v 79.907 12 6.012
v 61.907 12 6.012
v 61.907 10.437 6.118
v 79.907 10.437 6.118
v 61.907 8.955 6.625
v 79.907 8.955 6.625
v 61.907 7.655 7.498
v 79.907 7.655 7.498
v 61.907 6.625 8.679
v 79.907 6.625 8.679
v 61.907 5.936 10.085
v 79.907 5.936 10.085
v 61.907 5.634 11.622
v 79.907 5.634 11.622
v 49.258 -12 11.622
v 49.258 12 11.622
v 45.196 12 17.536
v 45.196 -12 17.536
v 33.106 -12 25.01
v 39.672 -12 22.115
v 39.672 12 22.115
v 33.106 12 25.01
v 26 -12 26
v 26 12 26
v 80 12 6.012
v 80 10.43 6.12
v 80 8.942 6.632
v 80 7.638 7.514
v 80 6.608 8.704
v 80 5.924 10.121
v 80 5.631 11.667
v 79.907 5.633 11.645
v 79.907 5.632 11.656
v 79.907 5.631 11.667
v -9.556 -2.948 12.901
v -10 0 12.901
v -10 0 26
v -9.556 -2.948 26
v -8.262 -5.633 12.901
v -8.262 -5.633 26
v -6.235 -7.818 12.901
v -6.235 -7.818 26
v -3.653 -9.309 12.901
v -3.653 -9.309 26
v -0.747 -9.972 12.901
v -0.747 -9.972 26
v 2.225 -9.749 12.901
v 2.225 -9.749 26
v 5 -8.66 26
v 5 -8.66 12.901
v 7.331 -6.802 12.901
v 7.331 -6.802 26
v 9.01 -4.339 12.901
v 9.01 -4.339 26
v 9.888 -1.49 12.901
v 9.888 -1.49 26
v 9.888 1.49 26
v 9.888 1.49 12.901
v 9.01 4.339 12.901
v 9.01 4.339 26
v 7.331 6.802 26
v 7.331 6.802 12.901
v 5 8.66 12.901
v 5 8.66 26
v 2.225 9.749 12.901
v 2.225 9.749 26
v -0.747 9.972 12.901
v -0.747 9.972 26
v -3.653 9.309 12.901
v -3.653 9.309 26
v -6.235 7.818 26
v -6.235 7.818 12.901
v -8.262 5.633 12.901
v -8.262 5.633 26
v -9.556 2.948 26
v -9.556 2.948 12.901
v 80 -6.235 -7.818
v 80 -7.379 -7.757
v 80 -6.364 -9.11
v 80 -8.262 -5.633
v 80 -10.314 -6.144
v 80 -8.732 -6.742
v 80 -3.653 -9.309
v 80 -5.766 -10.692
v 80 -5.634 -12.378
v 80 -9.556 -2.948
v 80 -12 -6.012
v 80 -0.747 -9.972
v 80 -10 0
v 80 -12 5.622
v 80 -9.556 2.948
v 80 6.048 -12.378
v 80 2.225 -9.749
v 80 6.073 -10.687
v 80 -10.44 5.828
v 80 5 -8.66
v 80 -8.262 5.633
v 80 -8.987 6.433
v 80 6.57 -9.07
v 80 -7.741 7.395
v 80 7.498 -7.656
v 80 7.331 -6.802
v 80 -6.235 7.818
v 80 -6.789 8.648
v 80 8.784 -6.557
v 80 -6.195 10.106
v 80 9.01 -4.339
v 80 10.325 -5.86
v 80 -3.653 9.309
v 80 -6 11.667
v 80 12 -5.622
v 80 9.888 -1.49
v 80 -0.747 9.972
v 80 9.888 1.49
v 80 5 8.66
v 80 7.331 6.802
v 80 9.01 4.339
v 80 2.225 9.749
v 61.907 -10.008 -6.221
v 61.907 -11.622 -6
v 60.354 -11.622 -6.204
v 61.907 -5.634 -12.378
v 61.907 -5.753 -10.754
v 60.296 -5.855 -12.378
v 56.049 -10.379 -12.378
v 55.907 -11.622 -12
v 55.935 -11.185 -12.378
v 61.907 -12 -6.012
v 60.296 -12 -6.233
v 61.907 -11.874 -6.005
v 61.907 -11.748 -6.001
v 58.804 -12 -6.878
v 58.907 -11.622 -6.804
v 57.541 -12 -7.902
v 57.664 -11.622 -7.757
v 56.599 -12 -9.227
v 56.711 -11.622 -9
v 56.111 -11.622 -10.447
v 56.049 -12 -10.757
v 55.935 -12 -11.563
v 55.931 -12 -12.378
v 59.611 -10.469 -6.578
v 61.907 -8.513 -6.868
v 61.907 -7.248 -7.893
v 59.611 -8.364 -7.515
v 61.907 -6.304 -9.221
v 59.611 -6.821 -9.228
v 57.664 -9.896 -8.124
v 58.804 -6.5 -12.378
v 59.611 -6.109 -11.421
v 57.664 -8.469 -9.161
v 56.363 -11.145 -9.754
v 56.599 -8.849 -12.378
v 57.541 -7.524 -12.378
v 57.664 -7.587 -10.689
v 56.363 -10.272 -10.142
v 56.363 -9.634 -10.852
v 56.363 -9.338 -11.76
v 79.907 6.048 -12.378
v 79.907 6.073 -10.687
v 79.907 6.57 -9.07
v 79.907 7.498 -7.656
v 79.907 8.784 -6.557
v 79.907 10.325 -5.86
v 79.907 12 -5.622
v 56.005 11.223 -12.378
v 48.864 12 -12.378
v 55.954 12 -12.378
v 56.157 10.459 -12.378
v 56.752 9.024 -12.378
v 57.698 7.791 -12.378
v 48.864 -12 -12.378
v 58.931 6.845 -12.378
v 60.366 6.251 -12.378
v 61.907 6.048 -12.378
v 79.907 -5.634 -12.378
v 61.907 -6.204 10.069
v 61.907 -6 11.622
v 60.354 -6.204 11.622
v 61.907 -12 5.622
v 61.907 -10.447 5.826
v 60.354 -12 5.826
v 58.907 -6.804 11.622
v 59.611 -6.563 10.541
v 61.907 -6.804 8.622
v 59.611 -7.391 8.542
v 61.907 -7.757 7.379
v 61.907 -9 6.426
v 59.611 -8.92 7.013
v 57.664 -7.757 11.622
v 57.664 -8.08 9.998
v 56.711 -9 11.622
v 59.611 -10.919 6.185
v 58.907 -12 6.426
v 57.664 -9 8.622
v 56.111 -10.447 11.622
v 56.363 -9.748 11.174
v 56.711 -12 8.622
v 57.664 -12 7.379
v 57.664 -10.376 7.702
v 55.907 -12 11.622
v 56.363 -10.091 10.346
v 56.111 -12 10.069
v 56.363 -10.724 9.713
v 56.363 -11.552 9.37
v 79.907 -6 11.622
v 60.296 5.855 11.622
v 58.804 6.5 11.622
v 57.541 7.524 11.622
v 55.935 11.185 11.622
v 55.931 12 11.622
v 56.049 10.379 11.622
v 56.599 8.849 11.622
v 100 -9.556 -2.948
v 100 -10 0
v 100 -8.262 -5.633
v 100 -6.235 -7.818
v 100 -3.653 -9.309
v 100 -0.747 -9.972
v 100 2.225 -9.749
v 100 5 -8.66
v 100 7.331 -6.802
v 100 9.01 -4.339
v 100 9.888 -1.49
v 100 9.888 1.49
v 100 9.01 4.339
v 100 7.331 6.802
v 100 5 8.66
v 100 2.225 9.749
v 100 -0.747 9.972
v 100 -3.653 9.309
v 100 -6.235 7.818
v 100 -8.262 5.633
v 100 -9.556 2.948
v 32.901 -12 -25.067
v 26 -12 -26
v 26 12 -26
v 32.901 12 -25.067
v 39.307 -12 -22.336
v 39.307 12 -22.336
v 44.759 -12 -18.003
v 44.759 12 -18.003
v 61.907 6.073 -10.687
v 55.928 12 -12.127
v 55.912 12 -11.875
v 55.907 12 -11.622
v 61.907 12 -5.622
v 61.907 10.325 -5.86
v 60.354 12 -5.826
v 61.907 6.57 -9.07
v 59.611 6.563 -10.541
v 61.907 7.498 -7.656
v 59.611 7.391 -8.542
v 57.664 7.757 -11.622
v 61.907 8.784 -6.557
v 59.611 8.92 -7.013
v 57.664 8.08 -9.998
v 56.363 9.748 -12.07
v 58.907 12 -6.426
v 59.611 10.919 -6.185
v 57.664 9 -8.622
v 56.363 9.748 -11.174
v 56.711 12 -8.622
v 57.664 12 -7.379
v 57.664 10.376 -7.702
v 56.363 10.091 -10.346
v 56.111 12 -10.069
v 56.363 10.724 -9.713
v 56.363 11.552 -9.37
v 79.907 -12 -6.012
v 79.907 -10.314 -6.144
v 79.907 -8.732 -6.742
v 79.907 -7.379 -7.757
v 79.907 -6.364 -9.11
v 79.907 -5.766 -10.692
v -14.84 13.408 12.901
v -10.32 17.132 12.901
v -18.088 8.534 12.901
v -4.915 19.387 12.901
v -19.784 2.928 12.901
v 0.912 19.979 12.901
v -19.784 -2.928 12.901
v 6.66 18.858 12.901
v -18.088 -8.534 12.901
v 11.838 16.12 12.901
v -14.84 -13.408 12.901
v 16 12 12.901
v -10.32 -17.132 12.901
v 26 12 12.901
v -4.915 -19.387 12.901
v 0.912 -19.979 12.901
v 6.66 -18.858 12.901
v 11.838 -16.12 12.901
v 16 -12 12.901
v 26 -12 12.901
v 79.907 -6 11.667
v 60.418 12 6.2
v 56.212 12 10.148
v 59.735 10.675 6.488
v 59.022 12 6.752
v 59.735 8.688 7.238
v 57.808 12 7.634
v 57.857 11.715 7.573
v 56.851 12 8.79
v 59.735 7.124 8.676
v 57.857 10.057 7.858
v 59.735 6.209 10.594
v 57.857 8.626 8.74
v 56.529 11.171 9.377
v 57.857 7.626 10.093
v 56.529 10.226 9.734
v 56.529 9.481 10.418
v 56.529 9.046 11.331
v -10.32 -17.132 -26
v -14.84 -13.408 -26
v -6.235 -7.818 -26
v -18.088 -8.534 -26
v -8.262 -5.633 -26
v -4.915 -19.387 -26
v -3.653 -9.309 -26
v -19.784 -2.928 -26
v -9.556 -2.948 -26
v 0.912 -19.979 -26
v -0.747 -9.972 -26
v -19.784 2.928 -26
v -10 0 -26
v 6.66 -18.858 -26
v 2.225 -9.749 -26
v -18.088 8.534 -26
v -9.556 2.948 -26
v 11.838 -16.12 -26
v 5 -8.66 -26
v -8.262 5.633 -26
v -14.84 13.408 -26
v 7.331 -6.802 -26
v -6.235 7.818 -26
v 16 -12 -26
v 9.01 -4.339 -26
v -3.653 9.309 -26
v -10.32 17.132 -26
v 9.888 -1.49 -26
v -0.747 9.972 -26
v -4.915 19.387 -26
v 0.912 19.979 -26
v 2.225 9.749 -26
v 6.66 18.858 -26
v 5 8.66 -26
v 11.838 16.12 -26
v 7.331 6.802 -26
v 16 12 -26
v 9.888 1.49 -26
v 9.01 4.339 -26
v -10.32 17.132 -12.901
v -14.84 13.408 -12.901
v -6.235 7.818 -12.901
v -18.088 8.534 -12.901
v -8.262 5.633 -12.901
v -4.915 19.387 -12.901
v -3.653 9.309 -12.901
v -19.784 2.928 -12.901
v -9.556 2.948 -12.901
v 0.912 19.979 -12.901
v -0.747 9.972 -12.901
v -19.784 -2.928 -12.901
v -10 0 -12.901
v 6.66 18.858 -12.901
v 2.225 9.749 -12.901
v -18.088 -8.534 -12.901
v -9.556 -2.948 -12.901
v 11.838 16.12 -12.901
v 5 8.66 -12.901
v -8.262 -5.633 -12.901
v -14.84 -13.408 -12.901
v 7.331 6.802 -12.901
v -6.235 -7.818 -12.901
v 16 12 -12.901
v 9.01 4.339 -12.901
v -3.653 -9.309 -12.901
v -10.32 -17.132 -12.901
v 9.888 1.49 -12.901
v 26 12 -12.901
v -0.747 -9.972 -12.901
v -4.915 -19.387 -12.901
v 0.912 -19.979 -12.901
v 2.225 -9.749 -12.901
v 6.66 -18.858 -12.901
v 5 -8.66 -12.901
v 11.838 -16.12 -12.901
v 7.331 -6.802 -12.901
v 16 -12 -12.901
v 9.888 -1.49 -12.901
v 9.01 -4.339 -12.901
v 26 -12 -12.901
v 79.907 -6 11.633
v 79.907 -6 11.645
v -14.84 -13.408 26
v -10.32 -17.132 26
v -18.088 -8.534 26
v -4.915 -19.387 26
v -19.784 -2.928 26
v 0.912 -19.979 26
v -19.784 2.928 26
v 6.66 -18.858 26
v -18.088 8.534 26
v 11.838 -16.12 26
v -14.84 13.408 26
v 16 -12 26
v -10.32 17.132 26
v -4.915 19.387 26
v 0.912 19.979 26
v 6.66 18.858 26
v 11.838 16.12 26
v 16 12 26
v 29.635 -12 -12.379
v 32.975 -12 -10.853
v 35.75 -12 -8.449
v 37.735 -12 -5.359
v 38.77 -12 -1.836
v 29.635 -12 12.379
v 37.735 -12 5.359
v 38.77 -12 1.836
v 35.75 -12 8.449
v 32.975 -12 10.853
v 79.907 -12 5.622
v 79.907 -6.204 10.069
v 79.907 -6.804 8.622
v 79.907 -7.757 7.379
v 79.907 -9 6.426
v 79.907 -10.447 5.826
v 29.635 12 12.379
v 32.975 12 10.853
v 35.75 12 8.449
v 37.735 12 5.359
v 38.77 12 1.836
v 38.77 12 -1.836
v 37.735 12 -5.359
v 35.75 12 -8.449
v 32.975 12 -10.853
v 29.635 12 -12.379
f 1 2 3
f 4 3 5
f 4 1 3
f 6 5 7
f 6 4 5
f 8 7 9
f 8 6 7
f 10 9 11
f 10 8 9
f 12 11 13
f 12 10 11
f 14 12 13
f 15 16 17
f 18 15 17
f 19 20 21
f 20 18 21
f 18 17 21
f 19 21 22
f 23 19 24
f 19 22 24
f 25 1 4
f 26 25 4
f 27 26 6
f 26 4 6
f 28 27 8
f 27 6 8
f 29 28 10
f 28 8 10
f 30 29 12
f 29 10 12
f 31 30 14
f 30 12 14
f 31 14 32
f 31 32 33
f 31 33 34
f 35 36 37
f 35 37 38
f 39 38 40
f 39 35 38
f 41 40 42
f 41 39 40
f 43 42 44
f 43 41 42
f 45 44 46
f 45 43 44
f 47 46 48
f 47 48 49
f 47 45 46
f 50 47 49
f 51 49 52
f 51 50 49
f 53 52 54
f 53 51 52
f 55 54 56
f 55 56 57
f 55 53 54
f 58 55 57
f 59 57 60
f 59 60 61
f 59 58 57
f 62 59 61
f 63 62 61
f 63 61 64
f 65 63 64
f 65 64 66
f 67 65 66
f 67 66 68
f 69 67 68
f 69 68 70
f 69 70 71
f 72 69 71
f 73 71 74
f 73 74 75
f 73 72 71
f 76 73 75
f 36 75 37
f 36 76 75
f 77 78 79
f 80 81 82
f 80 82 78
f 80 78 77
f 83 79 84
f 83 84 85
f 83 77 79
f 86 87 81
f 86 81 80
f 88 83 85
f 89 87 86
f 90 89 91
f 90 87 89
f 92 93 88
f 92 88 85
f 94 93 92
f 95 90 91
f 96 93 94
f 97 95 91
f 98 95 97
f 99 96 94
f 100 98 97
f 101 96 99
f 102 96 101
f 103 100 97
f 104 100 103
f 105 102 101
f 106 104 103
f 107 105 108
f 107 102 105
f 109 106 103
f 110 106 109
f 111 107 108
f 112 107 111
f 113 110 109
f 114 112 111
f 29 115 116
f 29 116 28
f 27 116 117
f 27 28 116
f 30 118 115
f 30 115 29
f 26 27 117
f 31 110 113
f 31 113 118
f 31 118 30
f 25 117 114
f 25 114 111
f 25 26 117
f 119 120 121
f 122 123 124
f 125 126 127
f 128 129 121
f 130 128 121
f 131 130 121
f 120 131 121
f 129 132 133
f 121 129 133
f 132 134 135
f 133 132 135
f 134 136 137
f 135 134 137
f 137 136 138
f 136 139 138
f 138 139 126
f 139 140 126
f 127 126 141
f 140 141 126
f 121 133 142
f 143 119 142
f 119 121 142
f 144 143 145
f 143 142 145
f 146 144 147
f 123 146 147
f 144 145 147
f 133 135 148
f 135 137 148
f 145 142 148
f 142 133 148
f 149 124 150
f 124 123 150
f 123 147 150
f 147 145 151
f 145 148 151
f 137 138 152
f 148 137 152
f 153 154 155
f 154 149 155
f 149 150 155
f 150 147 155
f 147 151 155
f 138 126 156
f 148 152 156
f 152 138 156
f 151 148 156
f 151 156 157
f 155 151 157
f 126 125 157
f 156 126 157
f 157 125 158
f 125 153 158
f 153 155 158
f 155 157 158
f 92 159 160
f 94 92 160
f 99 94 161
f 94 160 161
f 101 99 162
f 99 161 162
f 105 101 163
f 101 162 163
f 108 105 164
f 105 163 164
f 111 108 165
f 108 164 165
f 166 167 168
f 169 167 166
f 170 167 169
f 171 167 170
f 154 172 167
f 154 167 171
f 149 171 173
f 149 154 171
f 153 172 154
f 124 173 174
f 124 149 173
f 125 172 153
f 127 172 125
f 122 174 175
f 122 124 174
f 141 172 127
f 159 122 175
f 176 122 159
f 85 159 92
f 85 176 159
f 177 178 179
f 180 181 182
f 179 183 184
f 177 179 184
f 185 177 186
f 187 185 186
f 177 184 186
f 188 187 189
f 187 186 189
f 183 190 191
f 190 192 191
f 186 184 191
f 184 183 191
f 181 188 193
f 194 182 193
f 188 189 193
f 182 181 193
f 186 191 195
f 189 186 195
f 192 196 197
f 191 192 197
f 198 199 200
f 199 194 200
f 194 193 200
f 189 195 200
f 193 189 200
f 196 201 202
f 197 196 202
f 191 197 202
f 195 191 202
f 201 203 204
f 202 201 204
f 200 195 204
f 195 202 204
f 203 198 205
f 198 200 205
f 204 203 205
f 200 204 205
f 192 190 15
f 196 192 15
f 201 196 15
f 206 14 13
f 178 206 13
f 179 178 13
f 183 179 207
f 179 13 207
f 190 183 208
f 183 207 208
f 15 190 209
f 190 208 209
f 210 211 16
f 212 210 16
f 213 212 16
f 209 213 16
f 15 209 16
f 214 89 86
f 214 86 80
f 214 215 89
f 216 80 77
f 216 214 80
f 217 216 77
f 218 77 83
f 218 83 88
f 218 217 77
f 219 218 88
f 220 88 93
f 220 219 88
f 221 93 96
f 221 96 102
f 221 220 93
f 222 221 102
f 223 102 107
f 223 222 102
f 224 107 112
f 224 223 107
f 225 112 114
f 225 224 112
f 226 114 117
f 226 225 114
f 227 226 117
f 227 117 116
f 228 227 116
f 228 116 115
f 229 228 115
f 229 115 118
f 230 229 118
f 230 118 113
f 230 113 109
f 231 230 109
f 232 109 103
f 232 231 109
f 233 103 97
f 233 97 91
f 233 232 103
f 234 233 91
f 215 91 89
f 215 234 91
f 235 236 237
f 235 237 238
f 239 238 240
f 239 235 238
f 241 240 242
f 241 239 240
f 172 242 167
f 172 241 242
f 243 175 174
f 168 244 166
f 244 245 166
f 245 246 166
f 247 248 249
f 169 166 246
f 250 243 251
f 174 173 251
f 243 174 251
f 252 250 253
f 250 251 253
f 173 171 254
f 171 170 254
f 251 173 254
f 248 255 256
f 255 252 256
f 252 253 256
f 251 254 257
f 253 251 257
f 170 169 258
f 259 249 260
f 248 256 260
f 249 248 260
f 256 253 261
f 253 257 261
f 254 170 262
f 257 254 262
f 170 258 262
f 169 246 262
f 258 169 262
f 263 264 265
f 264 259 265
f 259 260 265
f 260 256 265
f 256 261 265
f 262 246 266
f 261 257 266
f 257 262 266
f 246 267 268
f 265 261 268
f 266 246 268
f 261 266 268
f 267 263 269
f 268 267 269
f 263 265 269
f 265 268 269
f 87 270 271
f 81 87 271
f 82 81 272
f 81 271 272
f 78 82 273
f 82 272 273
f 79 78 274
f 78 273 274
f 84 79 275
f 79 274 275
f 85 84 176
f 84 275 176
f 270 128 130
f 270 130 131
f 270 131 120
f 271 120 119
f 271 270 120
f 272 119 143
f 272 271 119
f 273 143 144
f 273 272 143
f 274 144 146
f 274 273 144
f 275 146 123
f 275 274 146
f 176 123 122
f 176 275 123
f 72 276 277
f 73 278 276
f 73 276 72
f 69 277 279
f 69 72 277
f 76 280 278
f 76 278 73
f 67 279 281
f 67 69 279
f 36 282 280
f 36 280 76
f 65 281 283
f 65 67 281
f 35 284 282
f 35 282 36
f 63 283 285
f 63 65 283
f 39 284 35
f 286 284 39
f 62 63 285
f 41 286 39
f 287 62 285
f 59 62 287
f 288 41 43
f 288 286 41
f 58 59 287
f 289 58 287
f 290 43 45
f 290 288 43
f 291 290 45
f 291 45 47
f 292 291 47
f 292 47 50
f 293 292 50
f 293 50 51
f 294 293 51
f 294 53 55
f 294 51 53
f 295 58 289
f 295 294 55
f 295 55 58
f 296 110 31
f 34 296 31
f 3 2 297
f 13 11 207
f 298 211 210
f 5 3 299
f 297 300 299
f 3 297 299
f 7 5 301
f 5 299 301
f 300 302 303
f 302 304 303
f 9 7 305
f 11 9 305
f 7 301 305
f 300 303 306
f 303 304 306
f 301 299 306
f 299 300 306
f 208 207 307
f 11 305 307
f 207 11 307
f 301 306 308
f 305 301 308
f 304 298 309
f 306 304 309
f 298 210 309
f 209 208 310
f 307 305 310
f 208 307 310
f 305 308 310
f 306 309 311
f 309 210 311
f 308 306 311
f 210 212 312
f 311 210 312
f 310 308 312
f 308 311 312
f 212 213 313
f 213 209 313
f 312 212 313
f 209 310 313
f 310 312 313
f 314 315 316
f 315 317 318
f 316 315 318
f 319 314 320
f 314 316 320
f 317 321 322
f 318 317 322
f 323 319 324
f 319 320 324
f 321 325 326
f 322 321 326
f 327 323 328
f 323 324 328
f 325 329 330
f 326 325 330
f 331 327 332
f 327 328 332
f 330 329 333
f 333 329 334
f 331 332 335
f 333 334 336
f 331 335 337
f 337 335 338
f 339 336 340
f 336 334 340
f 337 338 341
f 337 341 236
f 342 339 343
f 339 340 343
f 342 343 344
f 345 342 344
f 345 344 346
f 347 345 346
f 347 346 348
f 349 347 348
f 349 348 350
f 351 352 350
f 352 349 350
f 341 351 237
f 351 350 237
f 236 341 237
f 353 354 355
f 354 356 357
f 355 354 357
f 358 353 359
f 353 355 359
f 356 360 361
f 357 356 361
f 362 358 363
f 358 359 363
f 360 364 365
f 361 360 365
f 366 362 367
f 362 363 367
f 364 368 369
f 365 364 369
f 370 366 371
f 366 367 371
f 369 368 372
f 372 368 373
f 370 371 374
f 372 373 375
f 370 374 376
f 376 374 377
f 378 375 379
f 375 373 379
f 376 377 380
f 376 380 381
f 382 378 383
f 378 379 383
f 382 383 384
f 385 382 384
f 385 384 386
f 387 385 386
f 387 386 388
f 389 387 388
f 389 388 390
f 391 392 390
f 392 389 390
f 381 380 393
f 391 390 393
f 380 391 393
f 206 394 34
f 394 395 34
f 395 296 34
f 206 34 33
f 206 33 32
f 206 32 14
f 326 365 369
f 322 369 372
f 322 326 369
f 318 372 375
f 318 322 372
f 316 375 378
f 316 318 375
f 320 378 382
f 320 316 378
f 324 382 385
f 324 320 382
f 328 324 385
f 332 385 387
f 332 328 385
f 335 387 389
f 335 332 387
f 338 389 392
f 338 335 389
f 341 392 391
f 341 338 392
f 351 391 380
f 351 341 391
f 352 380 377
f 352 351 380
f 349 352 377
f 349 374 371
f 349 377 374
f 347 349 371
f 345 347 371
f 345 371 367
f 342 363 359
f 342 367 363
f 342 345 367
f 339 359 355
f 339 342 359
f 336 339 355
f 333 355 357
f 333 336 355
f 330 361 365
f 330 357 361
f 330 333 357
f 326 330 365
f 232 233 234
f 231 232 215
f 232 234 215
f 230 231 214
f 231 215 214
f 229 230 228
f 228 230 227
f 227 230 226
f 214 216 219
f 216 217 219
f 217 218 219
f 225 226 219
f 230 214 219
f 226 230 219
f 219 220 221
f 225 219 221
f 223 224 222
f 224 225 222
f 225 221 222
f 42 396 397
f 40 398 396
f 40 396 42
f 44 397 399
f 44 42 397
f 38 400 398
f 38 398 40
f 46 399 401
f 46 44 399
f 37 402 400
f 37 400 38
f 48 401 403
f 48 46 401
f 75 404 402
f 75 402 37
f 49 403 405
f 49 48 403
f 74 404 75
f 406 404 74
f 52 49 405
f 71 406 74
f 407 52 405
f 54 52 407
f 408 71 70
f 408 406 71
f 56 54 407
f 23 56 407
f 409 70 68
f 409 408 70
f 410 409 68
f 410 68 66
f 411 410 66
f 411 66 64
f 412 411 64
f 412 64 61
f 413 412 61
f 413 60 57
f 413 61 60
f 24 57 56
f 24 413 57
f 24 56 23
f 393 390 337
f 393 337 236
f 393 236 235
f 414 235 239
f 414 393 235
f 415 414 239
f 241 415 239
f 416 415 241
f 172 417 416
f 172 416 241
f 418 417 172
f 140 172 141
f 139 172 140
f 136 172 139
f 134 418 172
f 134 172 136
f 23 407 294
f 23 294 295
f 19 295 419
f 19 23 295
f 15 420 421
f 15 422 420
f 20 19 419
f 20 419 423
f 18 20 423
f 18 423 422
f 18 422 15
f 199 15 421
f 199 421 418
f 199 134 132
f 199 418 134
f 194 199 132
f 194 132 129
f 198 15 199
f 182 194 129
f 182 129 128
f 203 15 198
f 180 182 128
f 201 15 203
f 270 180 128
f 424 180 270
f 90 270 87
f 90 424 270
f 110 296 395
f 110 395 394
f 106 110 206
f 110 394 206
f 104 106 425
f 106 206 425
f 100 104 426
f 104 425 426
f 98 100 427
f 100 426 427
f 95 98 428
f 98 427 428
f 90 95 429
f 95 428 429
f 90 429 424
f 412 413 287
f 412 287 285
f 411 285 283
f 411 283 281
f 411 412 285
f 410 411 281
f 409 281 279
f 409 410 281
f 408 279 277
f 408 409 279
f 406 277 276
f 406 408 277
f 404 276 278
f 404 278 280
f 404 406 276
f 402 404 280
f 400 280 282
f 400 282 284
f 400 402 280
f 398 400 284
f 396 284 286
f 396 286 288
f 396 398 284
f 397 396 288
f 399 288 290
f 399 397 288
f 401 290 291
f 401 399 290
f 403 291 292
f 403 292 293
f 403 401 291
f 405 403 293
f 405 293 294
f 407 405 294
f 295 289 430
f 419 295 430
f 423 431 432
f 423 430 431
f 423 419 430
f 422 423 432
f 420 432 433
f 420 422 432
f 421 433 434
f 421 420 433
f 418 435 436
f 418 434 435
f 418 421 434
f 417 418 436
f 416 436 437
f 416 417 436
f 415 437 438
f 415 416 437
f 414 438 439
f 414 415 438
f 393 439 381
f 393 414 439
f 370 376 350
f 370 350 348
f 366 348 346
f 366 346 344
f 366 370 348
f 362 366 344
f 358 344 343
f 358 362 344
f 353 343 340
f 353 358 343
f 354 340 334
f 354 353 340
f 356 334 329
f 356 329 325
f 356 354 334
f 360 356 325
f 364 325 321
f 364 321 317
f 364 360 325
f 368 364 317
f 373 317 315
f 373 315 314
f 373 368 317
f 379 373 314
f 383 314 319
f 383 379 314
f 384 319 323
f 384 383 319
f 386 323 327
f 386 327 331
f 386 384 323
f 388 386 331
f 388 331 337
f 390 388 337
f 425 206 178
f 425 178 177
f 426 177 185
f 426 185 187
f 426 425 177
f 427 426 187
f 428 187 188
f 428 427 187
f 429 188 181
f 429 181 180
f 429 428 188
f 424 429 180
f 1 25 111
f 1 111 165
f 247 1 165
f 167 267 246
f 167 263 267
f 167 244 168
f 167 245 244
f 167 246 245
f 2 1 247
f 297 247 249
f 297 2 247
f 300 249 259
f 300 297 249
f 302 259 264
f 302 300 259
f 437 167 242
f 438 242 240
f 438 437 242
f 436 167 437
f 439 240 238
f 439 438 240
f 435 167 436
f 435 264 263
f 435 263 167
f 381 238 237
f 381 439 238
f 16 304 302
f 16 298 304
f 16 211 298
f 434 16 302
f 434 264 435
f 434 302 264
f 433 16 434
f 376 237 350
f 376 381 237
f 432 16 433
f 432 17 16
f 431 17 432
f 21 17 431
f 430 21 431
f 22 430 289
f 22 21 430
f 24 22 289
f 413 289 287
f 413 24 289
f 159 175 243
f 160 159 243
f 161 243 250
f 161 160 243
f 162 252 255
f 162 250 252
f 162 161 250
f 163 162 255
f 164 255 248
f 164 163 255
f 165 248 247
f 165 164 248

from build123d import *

# Parameters (mm, degrees)
SKETCH1_W           = 20
SKETCH1_H           = 10
SKETCH1_8_R         = 10
BOSS_EXTRUDE4_DEPTH = 26
CUT_EXTRUDE2_DEPTH  = 26
SKETCH5_W           = 14.33272529
SKETCH5_H           = 24
CUT_EXTRUDE3_DEPTH  = 10
SKETCH7_R           = 6
CUT_EXTRUDE4_DEPTH  = 10
CIRPATTERN2_COUNT   = 4
CIRPATTERN3_COUNT   = 4


with BuildPart() as part:
    # Sketch1 → Revolve1 (revolve)
    with BuildSketch(Plane.XY):
        with Locations((90, 5)):
            Rectangle(SKETCH1_W, SKETCH1_H)
    revolve(axis=Axis((80, 0, 0), (1, 0, 0)))

    # Sketch1<8> → Boss-Extrude4 (add, symmetric)
    with BuildSketch(Plane.XY):
        with BuildLine():
            ThreePointArc((16, 12), (-20, 0), (16, -12))
            Line((16, -12), (80, -12))
            Line((80, -12), (80, 12))
            Line((80, 12), (16, 12))
        make_face()
        Circle(SKETCH1_8_R, mode=Mode.SUBTRACT)
    extrude(amount=BOSS_EXTRUDE4_DEPTH, both=True)

    # Sketch4 → Cut-Extrude2 (cut, symmetric)
    with BuildSketch(Plane(origin=(0, 0, 0), x_dir=(1, 0, 0), z_dir=(0, 1, 0))):
        with BuildLine():
            Line((48.864488658, 12.378011085), (80, 12.378011085))
            Line((80, 12.378011085), (80, 26))
            Line((80, 26), (26, 26))
            ThreePointArc((26, 26), (39.307360966, 22.336386102), (48.864488658, 12.378011085))
        make_face()
        with BuildLine():
            Line((26, -26), (80, -26))
            Line((80, -26), (79.906653098, -11.621988915))
            Line((79.906653098, -11.621988915), (49.257888418, -11.621988915))
            ThreePointArc((49.257888418, -11.621988915), (39.671654768, -22.115285571), (26, -26))
        make_face()
        with BuildLine():
            ThreePointArc((26, -12.901292498), (38.901292498, 0), (26, 12.901292498))
            Line((26, 12.901292498), (-20, 12.901292498))
            Line((-20, 12.901292498), (-20, -12.901292498))
            Line((-20, -12.901292498), (26, -12.901292498))
        make_face()
    extrude(amount=CUT_EXTRUDE2_DEPTH, both=True, mode=Mode.SUBTRACT)

    # Sketch5 → Cut-Extrude3 (cut)
    with BuildSketch(Plane(origin=(80, 0, 0), x_dir=(0, 0, -1), z_dir=(1, 0, 0))):
        with Locations((-18.833637355, 0)):
            Rectangle(SKETCH5_W, SKETCH5_H)
    extrude(amount=-CUT_EXTRUDE3_DEPTH, mode=Mode.SUBTRACT)

    # Sketch6 → Cut-Revolve3 (revolve, cut)
    with BuildSketch(Plane.XY.offset(11.621988915)):
        with BuildLine():
            Line((79.906653098, -12), (79.906653098, -6))
            Line((79.906653098, -6), (61.906653098, -6))
            ThreePointArc((61.906653098, -6), (57.664012411, -7.757359313), (55.906653098, -12))
            Line((55.906653098, -12), (79.906653098, -12))
        make_face()
    cut_revolve3 = revolve(axis=Axis((81.079011265, -12, 11.621988915), (-1, 0, 0)), mode=Mode.SUBTRACT)

    # Sketch7 → Cut-Extrude4 (cut)
    with BuildSketch(Plane.ZY.offset(-79.906653098)):
        with Locations((11.621988915, -12)):
            Circle(SKETCH7_R)
    cut_extrude4 = extrude(amount=-CUT_EXTRUDE4_DEPTH, mode=Mode.SUBTRACT)

    # CirPattern2: Cut-Revolve3 ×4 about axis
    cirpattern2_axis = Axis((81.079011265, -12, 11.621988915), (1, 0, 0))
    for i in range(1, CIRPATTERN2_COUNT):
        add(cut_revolve3.rotate(cirpattern2_axis, i * 360 / CIRPATTERN2_COUNT), mode=Mode.SUBTRACT)

    # CirPattern3: Cut-Revolve3, Cut-Extrude4 ×4 about axis
    cirpattern3_axis = Axis((100, 0, 0), (-1, 0, 0))
    add([cut_revolve3.rotate(cirpattern3_axis, i * 360 / CIRPATTERN3_COUNT) for i in range(1, CIRPATTERN3_COUNT)], mode=Mode.SUBTRACT)
    add([cut_extrude4.rotate(cirpattern3_axis, i * 360 / CIRPATTERN3_COUNT) for i in range(1, CIRPATTERN3_COUNT)], mode=Mode.SUBTRACT)


solid = part.part
